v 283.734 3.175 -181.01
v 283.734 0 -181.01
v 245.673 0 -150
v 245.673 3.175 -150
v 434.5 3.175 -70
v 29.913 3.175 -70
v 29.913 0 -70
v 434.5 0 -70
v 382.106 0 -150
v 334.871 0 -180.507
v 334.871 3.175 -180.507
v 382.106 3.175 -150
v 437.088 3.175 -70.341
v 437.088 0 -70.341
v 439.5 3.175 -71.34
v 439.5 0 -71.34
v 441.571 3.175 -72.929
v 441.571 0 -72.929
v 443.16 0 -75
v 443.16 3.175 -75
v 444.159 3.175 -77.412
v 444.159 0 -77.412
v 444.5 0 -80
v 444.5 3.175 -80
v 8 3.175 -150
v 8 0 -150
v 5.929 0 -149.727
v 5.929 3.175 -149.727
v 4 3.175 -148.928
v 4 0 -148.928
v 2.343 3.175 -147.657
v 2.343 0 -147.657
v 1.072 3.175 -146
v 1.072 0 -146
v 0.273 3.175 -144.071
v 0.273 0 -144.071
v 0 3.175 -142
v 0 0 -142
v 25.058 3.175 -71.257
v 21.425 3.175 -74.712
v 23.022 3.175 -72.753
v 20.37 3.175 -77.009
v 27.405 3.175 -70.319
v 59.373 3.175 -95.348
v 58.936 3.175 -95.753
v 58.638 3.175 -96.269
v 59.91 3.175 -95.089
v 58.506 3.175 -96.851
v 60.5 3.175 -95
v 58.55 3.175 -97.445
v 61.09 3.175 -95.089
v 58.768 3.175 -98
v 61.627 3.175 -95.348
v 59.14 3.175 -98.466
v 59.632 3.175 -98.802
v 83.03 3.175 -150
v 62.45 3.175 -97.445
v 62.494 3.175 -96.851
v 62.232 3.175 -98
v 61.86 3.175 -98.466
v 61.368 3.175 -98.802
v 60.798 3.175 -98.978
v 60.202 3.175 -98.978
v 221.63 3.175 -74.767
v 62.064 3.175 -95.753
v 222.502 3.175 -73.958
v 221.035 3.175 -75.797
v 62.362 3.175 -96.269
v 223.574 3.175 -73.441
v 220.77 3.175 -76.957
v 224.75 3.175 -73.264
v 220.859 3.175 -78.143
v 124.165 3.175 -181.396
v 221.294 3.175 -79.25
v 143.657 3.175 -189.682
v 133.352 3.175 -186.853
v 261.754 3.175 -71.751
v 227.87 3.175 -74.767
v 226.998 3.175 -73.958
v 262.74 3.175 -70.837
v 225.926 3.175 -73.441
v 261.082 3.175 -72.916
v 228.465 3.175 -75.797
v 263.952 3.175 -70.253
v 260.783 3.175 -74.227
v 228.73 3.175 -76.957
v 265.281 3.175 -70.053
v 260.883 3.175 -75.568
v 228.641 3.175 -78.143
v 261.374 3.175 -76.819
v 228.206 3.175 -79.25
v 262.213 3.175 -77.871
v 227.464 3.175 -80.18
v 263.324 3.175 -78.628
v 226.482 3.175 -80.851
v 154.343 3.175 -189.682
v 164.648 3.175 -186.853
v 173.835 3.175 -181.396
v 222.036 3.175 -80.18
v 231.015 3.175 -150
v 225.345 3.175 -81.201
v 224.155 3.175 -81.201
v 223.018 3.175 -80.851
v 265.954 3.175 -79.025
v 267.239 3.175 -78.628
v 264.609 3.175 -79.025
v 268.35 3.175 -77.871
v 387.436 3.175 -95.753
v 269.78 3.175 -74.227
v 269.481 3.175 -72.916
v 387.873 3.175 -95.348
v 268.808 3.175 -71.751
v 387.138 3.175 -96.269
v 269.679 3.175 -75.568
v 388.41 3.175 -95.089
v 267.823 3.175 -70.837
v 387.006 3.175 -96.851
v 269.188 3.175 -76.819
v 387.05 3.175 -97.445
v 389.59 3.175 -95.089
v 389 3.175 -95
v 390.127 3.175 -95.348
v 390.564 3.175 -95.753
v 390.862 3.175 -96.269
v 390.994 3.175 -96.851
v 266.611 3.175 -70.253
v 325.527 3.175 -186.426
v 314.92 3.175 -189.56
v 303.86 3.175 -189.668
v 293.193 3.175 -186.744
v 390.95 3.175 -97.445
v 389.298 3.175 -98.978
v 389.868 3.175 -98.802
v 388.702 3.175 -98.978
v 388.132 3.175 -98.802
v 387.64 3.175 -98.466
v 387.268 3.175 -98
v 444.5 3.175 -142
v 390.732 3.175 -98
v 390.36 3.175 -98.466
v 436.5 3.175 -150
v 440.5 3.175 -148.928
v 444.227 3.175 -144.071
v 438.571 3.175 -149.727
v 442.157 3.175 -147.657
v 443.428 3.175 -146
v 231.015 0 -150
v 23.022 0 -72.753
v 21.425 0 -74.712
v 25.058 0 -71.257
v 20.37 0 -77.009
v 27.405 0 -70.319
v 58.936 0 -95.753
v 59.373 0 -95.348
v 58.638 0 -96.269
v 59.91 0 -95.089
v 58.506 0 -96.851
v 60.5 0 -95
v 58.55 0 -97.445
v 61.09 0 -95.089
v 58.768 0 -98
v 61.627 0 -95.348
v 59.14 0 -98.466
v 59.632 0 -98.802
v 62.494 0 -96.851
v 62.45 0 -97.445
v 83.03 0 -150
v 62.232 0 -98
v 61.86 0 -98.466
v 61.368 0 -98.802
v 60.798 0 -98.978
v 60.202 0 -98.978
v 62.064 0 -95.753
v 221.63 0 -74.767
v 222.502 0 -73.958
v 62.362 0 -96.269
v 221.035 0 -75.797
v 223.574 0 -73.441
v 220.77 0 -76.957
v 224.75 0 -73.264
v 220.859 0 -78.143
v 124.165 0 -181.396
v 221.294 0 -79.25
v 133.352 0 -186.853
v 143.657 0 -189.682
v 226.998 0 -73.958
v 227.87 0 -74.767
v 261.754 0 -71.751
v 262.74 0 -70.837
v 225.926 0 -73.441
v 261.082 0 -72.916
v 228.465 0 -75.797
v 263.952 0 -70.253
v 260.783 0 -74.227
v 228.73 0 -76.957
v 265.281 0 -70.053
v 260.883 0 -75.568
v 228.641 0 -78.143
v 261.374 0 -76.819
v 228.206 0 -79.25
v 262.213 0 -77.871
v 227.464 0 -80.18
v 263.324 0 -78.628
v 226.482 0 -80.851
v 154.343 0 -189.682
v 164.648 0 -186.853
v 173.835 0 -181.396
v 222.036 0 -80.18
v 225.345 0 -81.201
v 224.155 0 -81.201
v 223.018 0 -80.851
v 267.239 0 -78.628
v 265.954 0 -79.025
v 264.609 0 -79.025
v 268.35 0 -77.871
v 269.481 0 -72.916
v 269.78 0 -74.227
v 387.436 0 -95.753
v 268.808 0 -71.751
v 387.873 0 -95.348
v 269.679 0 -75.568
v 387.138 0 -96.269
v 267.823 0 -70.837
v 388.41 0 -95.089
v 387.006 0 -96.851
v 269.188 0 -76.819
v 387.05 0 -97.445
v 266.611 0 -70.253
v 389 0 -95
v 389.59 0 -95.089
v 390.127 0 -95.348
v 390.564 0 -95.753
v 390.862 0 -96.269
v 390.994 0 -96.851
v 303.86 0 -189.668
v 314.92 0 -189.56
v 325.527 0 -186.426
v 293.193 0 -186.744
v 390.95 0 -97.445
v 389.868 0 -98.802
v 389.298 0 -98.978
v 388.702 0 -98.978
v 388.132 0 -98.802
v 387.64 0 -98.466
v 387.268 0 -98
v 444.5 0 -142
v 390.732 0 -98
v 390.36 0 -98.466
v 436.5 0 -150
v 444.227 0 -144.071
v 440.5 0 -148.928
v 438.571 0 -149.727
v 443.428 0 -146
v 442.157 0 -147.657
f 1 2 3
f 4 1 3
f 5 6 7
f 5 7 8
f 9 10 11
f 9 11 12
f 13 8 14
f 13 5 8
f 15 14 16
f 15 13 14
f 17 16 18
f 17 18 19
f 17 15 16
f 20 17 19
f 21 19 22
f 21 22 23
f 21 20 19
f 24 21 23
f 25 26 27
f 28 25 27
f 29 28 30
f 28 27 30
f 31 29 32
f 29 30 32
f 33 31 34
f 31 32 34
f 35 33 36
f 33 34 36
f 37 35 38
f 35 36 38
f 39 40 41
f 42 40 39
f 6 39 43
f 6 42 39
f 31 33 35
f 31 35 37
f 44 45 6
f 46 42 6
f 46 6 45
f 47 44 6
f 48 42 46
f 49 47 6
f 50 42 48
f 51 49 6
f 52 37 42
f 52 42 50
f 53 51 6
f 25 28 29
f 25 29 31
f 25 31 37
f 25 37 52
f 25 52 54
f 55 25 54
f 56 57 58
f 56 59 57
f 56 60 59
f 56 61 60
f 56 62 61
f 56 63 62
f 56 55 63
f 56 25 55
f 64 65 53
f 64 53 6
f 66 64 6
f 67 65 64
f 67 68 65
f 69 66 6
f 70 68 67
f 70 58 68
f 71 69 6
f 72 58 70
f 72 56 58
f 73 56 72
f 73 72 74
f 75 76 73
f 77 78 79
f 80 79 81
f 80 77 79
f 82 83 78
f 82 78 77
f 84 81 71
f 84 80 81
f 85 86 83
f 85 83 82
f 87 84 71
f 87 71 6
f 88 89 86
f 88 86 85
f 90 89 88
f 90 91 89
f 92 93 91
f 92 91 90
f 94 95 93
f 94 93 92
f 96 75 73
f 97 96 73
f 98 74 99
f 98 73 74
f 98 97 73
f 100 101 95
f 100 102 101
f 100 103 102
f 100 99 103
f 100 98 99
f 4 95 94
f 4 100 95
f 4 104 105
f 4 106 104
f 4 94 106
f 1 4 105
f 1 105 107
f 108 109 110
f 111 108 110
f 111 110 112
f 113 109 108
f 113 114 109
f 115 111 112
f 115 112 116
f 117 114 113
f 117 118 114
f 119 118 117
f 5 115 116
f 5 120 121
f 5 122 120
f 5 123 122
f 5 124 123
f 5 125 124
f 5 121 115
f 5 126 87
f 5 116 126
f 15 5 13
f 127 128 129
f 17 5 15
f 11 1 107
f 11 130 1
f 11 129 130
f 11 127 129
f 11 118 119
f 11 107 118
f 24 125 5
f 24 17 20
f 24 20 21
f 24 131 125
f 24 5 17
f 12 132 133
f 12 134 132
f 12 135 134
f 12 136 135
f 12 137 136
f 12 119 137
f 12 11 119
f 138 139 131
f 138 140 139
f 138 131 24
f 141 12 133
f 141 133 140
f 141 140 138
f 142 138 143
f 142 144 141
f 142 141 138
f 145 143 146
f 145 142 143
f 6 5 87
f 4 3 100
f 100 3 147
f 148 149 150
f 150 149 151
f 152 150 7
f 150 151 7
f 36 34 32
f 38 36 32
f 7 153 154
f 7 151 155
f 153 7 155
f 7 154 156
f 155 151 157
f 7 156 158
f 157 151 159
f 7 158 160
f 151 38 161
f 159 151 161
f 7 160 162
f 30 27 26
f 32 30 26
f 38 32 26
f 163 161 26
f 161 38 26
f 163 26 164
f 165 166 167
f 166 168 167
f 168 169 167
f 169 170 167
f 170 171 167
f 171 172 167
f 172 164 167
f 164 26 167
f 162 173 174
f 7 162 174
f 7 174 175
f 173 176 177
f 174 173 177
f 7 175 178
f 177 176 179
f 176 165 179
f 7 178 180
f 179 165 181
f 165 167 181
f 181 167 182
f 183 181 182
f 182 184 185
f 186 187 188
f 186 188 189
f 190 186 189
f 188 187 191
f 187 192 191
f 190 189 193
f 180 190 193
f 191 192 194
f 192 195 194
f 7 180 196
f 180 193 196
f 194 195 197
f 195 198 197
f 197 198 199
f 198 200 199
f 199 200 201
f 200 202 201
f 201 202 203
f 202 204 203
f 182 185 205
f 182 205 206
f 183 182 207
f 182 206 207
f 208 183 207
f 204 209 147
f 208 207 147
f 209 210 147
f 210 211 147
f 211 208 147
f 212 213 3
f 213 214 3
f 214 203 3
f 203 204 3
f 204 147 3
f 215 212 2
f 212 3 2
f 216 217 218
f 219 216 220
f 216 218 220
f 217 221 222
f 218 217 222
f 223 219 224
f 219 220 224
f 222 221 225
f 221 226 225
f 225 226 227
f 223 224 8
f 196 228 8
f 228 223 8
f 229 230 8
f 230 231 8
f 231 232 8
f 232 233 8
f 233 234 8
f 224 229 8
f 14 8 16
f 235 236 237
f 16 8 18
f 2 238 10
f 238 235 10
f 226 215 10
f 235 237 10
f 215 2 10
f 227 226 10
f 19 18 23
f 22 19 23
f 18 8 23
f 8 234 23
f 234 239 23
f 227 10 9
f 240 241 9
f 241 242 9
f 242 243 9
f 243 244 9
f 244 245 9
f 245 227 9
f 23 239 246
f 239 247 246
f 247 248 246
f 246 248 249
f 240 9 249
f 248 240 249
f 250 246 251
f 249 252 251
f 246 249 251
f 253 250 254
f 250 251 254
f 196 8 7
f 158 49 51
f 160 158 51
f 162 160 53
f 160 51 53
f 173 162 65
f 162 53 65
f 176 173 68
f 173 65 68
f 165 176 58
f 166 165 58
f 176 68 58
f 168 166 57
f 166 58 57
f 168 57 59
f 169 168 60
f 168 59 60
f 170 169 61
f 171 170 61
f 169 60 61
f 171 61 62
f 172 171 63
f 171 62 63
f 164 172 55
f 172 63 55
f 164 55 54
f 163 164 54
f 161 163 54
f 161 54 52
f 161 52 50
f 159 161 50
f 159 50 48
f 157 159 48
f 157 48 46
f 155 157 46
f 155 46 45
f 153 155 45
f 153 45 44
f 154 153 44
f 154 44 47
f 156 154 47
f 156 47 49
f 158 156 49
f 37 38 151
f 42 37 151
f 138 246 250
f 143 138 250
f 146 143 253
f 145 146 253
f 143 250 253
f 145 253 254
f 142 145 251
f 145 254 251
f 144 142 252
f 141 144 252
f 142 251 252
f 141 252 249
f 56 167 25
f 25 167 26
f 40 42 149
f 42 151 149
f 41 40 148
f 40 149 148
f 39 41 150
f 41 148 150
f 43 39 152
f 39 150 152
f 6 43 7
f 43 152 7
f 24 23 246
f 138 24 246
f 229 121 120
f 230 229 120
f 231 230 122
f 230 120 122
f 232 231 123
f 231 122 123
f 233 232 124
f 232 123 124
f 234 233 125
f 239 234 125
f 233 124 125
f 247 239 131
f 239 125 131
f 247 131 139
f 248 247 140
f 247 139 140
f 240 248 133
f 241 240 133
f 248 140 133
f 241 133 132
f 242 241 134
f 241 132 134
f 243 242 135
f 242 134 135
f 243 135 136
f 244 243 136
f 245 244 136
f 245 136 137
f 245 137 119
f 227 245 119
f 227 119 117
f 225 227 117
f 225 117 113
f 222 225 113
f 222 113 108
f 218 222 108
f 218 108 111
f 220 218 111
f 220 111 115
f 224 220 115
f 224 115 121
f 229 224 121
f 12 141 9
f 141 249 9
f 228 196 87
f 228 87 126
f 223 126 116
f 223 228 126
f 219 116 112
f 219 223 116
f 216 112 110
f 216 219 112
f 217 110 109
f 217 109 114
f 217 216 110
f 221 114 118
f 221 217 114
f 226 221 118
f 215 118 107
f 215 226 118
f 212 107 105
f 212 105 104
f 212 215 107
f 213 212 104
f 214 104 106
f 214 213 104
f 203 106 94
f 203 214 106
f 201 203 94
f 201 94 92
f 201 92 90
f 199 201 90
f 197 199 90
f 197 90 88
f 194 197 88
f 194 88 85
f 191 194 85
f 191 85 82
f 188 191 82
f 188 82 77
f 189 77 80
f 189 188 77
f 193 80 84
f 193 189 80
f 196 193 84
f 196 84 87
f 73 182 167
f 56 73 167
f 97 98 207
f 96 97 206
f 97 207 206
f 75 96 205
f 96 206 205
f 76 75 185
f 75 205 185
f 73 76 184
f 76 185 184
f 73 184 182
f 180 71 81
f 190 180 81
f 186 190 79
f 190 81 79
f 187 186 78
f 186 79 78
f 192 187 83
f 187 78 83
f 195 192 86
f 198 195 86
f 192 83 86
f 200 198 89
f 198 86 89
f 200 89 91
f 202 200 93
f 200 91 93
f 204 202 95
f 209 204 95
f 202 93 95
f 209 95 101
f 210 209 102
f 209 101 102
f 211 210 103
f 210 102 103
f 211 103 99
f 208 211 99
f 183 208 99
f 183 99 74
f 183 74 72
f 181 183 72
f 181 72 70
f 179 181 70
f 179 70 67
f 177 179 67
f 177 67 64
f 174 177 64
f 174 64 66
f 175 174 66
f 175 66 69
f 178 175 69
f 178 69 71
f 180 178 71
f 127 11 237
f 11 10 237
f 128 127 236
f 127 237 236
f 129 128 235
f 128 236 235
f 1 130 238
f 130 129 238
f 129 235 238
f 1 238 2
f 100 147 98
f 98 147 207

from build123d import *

# Parameters (mm, degrees)
SKETCH1_R           = 3.716178426
SKETCH1_R_2         = 4.313560469
SKETCH1_R_3         = 4.511205791
BOSS_EXTRUDE1_DEPTH = 3.175
SKETCH2_W           = 597.466303312
SKETCH2_H           = 60.972543052
CUT_EXTRUDE1_DEPTH  = 70
FILLET1_R           = 10
FILLET2_R           = 10
SKETCH3_R           = 3.990837639
CUT_EXTRUDE2_DEPTH  = 10
SKETCH4_R           = 2
CUT_EXTRUDE3_DEPTH  = 470.13785887
SKETCH5_R           = 2
CUT_EXTRUDE4_DEPTH  = 10
SKETCH6_R           = 40
BOSS_EXTRUDE2_DEPTH = 3.175
BOSS_EXTRUDE3_DEPTH = 3.175
SKETCH9_R           = 40
BOSS_EXTRUDE4_DEPTH = 3.175
BOSS_EXTRUDE6_DEPTH = 3.175


with BuildPart() as part:
    # Sketch1 → Boss-Extrude1 (new body)
    with BuildSketch(Plane(origin=(0, 0, 0), x_dir=(1, 0, 0), z_dir=(0, 1, 0))):
        with BuildLine():
            ThreePointArc((8, 150), (2.343145751, 147.656854249), (0, 142))
            Line((0, 142), (42, 8))
            ThreePointArc((42, 8), (44.343145751, 2.343145751), (50, 0))
            Line((50, 0), (436.5, 0))
            ThreePointArc((436.5, 0), (442.156854249, 2.343145751), (444.5, 8))
            Line((444.5, 8), (444.5, 142))
            ThreePointArc((444.5, 142), (442.156854249, 147.656854249), (436.5, 150))
            Line((436.5, 150), (8, 150))
        make_face()
        with Locations(Location((146.269370224, 139.84039861, 0), (0, 0, 270))):
            Circle(SKETCH1_R, mode=Mode.SUBTRACT)
        with Locations(Location((307.606475607, 140.710564477, 0), (0, 0, 270))):
            Circle(SKETCH1_R_2, mode=Mode.SUBTRACT)
        with Locations(Location((265.281257274, 74.563866981, 0), (0, 0, 270))):
            Circle(SKETCH1_R_3, mode=Mode.SUBTRACT)
    extrude(amount=BOSS_EXTRUDE1_DEPTH)

    # Sketch2 → Cut-Extrude1 (cut)
    with BuildSketch(Plane.XY):
        with Locations((220.1785332, 7.544358636)):
            Rectangle(SKETCH2_W, SKETCH2_H)
    extrude(amount=-CUT_EXTRUDE1_DEPTH, mode=Mode.SUBTRACT)

    # Fillet1
    fillet1_edges = [part.edges().sort_by_distance(p)[0] for p in [
        (22.567164179, 1.5875, -70),
    ]]
    fillet(fillet1_edges, radius=FILLET1_R)

    # Fillet2
    fillet2_edges = [part.edges().sort_by_distance(p)[0] for p in [
        (444.5, 1.5875, -70),
    ]]
    fillet(fillet2_edges, radius=FILLET2_R)

    # Sketch3 → Cut-Extrude2 (cut)
    with BuildSketch(Plane(origin=(0, 3.175, 0), x_dir=(1, 0, 0), z_dir=(0, 1, 0))):
        with Locations(Location((224.75, 77.255, 0), (0, 0, 270))):
            Circle(SKETCH3_R)
    extrude(amount=-CUT_EXTRUDE2_DEPTH, mode=Mode.SUBTRACT)

    # Sketch4 → Cut-Extrude3 (cut, through all)
    with BuildSketch(Plane(origin=(0, 3.175, 0), x_dir=(1, 0, 0), z_dir=(0, 1, 0))):
        with Locations(Location((60.5, 97, 0), (0, 0, 270))):
            Circle(SKETCH4_R)
    extrude(amount=-CUT_EXTRUDE3_DEPTH, mode=Mode.SUBTRACT)

    # Sketch5 → Cut-Extrude4 (cut)
    with BuildSketch(Plane(origin=(0, 3.175, 0), x_dir=(1, 0, 0), z_dir=(0, 1, 0))):
        with Locations(Location((389, 97, 0), (0, 0, 270))):
            Circle(SKETCH5_R)
    extrude(amount=-CUT_EXTRUDE4_DEPTH, mode=Mode.SUBTRACT)

    # Sketch6 → Boss-Extrude2 (add)
    with BuildSketch(Plane(origin=(0, 0, 0), x_dir=(1, 0, 0), z_dir=(0, 1, 0))):
        with Locations((149, 150.04039861)):
            Circle(SKETCH6_R)
    extrude(amount=BOSS_EXTRUDE2_DEPTH)

    # Sketch7 → Boss-Extrude3 (add)
    with BuildSketch(Plane(origin=(0, 0, 0), x_dir=(1, 0, 0), z_dir=(0, 1, 0))):
        Polygon((124.164543783, 181.396420591), (82.702881078, 149.750534228), (231.468946681, 149.750534228), (173.835456217, 181.396420591), align=None)
    extrude(amount=BOSS_EXTRUDE3_DEPTH)

    # Sketch9 → Boss-Extrude4 (add)
    with BuildSketch(Plane(origin=(0, 0, 0), x_dir=(1, 0, 0), z_dir=(0, 1, 0))):
        with BuildLine():
            ThreePointArc((269, 150), (272.870833001, 167.166341835), (283.734164599, 181.010281545))
            Line((283.734164599, 181.010281545), (245.673378314, 150))
            Line((245.673378314, 150), (269, 150))
        make_face()
        with Locations((309, 150)):
            Circle(SKETCH9_R)
    extrude(amount=BOSS_EXTRUDE4_DEPTH)

    # Sketch12 → Boss-Extrude6 (add)
    with BuildSketch(Plane(origin=(0, 0, 0), x_dir=(1, 0, 0), z_dir=(0, 1, 0))):
        Polygon((326.166341835, 186.129166999), (382.106475607, 150), (340.398839744, 150), align=None)
    extrude(amount=BOSS_EXTRUDE6_DEPTH)


solid = part.part
